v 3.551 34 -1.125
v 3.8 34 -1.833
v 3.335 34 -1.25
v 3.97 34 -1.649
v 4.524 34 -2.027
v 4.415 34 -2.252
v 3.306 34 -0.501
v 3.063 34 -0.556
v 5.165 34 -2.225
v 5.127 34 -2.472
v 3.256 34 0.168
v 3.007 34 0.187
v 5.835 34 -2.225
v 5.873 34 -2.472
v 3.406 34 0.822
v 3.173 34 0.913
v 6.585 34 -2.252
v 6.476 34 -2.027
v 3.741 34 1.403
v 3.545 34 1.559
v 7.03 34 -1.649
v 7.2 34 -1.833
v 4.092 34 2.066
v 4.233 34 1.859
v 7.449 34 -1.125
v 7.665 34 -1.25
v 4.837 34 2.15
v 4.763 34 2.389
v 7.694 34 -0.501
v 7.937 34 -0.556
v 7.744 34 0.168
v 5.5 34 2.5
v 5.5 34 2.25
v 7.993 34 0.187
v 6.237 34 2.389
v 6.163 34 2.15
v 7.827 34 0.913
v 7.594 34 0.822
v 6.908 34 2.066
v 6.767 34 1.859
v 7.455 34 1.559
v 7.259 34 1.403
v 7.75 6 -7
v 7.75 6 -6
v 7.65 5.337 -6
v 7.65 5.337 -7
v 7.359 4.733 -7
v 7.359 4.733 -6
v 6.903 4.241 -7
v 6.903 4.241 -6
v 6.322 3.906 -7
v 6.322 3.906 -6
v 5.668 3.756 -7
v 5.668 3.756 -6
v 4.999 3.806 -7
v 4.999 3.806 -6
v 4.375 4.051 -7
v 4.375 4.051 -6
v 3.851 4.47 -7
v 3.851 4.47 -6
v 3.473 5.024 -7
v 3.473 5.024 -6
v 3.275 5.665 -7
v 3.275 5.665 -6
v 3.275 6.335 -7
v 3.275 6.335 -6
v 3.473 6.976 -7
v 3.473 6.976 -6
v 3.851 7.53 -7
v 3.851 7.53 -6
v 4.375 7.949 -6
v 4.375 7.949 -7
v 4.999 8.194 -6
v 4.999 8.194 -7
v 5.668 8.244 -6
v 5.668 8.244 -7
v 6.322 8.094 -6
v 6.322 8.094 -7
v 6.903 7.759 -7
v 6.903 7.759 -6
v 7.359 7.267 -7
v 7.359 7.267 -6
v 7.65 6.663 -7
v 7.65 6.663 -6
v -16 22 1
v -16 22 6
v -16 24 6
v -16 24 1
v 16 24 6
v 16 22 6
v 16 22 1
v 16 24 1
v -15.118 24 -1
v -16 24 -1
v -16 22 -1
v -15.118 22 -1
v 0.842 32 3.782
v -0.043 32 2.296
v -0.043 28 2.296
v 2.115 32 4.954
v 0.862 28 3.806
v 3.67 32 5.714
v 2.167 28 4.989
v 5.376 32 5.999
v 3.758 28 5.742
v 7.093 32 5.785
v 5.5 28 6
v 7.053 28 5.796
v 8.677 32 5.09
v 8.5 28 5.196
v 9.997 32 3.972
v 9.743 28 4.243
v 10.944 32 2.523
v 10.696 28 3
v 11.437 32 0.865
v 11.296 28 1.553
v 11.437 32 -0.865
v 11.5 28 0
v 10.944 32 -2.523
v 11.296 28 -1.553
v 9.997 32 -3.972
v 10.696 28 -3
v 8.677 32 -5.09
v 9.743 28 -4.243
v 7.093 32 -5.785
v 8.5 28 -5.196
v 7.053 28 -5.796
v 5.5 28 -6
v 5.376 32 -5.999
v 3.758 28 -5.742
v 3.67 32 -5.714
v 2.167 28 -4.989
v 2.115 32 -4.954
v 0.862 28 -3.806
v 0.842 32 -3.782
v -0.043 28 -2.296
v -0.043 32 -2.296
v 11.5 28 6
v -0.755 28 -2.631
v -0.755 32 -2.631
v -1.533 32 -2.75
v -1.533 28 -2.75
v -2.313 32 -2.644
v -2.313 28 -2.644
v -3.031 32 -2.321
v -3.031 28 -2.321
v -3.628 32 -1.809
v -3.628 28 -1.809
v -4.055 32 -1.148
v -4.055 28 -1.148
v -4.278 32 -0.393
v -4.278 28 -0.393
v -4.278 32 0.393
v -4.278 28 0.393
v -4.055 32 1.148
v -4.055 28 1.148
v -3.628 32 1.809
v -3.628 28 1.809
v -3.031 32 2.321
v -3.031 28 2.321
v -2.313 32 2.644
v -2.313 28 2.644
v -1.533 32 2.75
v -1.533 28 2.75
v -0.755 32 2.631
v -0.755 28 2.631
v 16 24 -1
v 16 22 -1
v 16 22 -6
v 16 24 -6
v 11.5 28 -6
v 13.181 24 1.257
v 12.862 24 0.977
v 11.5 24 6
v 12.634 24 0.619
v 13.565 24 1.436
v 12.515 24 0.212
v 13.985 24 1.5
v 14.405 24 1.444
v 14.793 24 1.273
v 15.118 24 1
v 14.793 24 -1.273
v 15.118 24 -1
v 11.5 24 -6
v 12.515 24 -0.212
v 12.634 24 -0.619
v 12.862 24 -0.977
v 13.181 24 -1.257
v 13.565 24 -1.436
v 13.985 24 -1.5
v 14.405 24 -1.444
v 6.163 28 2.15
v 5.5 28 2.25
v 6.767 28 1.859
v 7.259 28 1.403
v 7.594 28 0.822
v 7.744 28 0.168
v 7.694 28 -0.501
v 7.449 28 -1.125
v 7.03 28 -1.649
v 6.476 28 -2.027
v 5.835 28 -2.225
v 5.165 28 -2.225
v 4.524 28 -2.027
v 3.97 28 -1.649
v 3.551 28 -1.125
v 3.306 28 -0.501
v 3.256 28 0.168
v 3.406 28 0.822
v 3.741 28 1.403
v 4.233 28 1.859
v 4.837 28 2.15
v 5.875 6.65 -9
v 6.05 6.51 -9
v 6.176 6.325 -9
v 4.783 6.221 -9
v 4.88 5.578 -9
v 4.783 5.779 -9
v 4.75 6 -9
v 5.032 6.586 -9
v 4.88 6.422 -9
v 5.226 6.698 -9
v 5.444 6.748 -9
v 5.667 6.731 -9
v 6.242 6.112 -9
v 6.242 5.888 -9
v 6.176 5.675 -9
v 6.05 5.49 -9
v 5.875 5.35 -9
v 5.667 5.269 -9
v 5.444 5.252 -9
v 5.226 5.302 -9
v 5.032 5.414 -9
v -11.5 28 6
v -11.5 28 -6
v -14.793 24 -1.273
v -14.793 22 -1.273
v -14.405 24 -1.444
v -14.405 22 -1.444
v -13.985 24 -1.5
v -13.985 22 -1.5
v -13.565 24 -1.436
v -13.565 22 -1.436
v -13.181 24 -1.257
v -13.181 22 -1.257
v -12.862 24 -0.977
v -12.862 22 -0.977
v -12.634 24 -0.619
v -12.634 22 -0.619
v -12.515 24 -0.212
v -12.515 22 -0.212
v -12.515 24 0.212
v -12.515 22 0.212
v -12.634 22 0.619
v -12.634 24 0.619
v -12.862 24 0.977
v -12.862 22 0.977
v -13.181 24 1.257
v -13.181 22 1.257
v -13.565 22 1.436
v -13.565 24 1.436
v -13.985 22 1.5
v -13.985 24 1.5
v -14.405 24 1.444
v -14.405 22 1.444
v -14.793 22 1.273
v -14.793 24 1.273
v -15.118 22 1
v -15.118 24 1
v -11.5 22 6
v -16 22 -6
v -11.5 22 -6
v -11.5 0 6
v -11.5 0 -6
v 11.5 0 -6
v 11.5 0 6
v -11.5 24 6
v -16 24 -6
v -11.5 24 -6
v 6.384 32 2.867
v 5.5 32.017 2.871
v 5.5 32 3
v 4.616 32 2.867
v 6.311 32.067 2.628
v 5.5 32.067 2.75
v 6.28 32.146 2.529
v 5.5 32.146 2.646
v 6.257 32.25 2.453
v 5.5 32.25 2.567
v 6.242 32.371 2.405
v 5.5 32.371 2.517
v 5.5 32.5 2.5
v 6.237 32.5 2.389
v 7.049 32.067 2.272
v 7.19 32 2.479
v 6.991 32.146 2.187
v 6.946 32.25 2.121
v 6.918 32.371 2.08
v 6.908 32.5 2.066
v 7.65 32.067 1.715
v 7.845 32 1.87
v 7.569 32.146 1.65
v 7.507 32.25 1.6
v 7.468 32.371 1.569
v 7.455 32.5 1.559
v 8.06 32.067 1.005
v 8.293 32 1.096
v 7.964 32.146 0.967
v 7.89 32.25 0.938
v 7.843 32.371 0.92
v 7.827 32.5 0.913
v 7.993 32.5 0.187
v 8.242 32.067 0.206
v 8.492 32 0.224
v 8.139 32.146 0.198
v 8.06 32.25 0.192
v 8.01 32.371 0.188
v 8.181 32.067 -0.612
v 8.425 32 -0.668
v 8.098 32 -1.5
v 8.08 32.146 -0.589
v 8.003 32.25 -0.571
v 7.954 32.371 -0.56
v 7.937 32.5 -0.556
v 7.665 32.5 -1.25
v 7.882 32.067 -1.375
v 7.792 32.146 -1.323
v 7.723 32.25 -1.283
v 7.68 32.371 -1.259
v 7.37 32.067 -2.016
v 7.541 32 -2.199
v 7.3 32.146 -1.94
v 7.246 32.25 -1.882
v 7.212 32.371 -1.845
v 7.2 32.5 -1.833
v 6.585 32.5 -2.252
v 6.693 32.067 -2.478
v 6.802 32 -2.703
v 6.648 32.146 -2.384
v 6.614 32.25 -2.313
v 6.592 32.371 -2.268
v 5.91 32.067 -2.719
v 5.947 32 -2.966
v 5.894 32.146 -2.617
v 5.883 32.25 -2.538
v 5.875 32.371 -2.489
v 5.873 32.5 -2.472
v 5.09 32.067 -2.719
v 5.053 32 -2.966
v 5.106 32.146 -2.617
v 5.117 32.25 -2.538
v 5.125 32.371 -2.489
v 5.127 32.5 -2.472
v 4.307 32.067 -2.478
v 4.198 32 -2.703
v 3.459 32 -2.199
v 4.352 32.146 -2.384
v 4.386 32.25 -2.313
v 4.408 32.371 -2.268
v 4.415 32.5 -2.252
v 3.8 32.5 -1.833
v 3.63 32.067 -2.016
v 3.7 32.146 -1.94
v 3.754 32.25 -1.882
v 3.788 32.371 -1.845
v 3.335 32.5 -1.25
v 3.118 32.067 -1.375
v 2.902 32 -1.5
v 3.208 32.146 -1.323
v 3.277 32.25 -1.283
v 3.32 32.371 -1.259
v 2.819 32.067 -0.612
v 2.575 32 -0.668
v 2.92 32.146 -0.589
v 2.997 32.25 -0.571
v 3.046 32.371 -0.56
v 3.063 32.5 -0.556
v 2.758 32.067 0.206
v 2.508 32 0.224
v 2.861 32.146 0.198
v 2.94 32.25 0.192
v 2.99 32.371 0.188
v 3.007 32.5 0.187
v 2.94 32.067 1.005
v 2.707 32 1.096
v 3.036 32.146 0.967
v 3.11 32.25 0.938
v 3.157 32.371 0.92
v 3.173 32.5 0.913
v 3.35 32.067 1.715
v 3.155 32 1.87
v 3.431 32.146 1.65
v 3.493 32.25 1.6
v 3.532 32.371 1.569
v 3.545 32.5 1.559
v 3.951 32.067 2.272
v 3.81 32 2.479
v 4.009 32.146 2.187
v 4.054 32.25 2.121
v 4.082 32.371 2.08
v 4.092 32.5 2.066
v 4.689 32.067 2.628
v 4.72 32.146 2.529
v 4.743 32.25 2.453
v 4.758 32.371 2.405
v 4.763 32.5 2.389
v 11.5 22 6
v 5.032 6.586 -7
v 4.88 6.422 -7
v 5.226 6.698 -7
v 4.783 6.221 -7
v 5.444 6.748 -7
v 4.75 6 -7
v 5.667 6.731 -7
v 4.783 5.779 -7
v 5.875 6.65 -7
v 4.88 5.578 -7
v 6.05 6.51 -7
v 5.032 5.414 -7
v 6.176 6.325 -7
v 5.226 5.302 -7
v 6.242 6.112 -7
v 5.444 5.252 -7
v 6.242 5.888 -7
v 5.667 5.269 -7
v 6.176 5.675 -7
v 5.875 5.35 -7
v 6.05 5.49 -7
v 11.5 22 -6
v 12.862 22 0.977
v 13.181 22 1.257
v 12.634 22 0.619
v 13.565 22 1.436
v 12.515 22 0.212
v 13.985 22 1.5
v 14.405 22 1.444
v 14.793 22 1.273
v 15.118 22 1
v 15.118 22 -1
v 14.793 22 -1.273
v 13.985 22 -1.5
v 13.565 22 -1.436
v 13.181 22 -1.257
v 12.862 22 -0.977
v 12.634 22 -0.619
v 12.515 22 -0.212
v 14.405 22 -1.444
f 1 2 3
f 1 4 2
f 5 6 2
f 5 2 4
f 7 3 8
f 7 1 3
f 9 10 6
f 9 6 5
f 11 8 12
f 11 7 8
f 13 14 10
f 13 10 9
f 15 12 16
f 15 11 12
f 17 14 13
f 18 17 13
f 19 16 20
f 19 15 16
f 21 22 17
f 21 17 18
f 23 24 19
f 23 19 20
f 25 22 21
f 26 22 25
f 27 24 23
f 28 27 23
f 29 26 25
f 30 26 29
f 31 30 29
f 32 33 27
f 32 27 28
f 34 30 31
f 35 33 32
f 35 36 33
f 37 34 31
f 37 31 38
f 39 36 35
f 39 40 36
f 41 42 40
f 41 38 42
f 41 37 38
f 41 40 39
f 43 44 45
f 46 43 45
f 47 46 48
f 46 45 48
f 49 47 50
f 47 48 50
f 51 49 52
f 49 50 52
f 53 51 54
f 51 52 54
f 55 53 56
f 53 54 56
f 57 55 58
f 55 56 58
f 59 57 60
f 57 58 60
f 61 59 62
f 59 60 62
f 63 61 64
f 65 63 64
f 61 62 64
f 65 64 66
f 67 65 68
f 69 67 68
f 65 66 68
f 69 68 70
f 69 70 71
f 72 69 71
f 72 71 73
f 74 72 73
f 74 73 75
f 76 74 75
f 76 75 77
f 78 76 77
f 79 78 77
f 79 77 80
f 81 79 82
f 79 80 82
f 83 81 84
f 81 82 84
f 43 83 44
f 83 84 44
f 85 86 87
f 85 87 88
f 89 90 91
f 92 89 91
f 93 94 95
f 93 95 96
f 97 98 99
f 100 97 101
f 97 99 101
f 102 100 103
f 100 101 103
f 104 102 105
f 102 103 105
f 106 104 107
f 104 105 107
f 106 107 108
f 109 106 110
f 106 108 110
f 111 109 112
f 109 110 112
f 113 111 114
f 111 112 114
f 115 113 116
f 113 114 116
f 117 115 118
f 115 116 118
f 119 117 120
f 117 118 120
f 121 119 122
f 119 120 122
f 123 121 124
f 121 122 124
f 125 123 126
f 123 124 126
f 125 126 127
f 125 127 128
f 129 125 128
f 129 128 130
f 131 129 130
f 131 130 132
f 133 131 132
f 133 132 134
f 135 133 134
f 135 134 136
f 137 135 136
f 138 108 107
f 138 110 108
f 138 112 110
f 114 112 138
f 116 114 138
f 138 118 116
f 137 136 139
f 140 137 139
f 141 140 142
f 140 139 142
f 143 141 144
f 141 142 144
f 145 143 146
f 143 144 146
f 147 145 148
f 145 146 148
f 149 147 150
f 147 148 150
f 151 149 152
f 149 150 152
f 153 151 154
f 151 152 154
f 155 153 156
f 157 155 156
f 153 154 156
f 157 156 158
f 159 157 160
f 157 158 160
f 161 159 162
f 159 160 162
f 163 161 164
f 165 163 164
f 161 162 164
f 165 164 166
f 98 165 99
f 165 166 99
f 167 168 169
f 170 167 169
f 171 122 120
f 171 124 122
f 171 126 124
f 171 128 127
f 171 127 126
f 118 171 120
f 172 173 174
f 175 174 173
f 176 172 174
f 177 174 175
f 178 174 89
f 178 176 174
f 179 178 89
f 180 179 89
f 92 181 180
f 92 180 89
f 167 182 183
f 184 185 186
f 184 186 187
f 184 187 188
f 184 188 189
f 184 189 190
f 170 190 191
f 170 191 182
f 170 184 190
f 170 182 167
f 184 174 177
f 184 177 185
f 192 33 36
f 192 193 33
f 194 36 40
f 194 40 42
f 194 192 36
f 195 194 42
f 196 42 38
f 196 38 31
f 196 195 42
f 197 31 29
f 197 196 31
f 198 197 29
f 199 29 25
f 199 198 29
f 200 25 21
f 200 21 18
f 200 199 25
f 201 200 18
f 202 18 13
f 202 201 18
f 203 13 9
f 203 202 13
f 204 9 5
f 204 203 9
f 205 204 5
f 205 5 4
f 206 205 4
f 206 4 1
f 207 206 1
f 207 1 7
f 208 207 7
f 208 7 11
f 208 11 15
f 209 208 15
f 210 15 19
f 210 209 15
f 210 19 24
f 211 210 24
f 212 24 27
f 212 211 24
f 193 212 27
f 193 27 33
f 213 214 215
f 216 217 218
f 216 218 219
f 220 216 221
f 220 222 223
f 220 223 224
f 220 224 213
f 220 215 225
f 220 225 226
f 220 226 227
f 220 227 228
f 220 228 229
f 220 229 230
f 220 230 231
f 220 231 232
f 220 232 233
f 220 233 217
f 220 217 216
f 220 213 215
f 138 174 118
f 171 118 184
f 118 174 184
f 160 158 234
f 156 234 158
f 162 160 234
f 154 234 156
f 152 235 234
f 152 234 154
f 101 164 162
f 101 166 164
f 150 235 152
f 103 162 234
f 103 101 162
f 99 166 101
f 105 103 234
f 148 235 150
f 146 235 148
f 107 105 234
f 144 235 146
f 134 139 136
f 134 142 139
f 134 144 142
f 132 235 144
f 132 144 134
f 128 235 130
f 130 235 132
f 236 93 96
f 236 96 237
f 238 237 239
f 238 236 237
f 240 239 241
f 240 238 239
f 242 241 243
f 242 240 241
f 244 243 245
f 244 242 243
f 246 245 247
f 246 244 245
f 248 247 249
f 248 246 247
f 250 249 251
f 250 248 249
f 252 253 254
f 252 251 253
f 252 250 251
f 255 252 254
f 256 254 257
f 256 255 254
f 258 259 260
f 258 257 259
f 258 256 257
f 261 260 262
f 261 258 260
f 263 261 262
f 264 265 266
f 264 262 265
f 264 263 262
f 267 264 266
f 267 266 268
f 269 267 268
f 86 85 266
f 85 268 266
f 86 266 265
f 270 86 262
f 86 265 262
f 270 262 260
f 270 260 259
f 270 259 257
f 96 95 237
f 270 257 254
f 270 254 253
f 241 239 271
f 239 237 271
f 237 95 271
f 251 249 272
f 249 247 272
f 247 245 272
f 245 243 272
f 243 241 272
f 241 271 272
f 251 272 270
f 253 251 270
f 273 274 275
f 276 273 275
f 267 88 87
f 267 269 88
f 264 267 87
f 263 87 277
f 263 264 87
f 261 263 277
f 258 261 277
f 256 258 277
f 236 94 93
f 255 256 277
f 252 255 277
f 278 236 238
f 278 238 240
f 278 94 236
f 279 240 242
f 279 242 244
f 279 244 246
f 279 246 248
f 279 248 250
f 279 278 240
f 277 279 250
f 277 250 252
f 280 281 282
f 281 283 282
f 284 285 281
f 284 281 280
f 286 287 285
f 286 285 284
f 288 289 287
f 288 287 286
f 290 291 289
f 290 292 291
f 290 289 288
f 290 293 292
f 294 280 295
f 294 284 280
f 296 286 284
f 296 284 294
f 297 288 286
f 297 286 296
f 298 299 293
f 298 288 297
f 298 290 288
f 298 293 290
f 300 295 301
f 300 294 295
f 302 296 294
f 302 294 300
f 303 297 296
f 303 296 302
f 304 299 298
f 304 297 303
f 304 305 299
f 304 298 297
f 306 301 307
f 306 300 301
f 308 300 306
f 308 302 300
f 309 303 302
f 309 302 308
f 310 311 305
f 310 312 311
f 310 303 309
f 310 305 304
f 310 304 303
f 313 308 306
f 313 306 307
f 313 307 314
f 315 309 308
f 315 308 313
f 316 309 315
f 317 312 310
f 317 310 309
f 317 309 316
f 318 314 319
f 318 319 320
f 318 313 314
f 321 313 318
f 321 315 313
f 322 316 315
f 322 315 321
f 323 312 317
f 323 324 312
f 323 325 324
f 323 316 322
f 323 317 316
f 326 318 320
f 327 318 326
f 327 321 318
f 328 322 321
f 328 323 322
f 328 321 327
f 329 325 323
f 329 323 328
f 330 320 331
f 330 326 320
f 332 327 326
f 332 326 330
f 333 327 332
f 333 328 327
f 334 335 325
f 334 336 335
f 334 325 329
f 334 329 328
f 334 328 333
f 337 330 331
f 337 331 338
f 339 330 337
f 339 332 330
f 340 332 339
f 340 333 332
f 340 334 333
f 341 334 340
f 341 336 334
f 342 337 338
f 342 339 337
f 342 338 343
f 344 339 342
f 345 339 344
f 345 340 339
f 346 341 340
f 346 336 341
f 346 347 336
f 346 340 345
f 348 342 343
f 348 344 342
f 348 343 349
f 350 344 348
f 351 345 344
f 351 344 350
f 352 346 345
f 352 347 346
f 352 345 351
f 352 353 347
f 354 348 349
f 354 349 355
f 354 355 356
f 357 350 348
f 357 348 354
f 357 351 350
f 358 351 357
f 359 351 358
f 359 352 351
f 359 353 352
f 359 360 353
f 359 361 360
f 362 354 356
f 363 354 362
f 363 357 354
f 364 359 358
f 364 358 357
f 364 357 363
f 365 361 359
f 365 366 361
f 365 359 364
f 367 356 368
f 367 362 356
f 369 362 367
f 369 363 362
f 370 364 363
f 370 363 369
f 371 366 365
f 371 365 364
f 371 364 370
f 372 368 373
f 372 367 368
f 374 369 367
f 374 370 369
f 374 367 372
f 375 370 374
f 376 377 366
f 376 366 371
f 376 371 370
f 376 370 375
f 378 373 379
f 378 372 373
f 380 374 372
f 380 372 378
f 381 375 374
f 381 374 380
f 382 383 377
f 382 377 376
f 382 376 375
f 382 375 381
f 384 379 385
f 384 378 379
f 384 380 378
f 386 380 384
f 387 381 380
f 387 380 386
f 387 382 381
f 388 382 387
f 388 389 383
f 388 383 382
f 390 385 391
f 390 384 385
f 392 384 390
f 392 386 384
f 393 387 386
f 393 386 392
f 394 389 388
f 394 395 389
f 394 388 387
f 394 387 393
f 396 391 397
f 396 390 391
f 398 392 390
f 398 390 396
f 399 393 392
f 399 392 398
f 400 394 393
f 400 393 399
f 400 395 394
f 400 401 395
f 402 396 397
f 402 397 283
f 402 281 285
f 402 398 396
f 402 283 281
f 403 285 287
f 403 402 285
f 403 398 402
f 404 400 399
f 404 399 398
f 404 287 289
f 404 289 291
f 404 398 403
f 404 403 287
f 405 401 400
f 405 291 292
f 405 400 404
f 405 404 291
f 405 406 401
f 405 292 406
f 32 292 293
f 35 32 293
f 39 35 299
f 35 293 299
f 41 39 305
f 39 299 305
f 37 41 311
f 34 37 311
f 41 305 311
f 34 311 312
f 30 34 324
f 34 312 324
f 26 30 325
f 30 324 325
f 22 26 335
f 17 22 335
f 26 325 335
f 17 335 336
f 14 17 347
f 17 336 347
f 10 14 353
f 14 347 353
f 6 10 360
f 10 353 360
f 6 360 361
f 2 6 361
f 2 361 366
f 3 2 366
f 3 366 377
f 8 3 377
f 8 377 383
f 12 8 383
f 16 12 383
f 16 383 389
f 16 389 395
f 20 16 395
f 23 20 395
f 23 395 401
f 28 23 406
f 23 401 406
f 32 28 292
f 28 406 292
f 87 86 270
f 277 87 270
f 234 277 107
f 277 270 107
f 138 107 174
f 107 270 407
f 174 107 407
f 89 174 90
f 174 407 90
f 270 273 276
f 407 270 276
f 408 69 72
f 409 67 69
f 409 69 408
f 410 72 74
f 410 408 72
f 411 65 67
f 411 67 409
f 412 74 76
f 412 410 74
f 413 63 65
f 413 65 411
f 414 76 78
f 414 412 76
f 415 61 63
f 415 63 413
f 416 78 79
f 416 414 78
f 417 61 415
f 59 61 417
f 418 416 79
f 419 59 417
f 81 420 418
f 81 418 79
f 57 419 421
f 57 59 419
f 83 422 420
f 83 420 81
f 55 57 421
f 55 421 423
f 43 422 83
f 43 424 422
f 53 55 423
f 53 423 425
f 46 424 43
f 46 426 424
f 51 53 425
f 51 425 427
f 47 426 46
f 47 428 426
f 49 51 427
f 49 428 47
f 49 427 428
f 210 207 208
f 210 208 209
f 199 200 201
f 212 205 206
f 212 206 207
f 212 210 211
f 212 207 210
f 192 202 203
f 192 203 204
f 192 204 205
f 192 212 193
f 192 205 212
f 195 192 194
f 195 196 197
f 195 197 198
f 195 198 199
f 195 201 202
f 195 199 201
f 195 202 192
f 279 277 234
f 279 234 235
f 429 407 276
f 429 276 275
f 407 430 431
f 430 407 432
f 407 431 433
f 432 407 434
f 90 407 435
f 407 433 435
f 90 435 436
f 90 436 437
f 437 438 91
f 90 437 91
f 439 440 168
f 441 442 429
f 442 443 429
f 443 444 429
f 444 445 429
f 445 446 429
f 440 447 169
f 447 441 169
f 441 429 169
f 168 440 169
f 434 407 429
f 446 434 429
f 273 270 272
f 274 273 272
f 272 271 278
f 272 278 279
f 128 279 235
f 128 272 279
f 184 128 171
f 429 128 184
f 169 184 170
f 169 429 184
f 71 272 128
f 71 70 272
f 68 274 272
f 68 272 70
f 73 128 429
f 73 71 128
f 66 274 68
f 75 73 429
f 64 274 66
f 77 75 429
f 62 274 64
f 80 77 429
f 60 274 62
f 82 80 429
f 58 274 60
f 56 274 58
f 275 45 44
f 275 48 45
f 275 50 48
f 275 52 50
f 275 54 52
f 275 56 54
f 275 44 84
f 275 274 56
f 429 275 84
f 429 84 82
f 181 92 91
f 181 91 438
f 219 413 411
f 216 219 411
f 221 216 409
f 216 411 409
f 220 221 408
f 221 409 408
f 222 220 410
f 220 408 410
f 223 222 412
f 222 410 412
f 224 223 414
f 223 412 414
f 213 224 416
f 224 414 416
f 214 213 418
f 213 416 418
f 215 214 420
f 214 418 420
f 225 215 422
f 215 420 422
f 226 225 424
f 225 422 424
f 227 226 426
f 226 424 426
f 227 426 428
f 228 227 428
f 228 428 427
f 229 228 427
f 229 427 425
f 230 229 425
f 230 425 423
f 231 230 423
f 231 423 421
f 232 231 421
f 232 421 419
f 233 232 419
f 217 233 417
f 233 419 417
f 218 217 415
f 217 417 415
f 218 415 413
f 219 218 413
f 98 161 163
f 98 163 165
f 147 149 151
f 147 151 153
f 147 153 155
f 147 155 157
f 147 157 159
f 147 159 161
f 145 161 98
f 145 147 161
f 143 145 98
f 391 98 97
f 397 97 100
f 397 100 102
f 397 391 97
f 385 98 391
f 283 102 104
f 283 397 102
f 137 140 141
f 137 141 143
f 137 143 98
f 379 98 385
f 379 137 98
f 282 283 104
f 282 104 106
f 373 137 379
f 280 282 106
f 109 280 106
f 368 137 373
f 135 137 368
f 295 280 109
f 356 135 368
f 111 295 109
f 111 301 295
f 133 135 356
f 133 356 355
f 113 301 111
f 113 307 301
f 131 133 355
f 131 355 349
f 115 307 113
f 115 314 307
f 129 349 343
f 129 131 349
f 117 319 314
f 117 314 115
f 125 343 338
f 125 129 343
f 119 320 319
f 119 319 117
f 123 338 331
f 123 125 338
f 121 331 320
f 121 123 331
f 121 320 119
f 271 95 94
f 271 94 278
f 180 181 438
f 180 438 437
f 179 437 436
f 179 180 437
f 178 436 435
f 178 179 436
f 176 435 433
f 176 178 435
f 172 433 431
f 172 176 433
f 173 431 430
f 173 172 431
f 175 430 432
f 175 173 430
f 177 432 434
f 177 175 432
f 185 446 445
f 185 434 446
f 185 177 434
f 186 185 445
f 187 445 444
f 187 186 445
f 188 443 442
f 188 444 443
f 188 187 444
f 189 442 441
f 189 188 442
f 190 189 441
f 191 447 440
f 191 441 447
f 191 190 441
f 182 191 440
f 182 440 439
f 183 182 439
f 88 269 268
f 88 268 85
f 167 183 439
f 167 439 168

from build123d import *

# Parameters (mm, degrees)
SKETCH1_W           = 23
SKETCH1_H           = 12
BOSS_EXTRUDE1_DEPTH = 22
SKETCH2_W           = 32
SKETCH2_H           = 12
BOSS_EXTRUDE2_DEPTH = 2
CUT_EXTRUDE1_DEPTH  = 5
SKETCH3_W           = 23
SKETCH3_H           = 12
BOSS_EXTRUDE4_DEPTH = 4
BOSS_EXTRUDE5_DEPTH = 4
SKETCH6_R           = 2.5
SKETCH6_R_2         = 2.25
BOSS_EXTRUDE6_DEPTH = 2
CUT_EXTRUDE2_START  = -4
SKETCH7_R           = 2.25
CUT_EXTRUDE2_DEPTH  = 4
FILLET4_R           = 0.5
SKETCH8_R           = 2.25
BOSS_EXTRUDE7_DEPTH = 1
SKETCH9_R           = 0.75
BOSS_EXTRUDE8_DEPTH = 2


with BuildPart() as part:
    # Sketch1 → Boss-Extrude1 (new body)
    with BuildSketch(Plane(origin=(0, 0, 0), x_dir=(1, 0, 0), z_dir=(0, 1, 0))):
        Rectangle(SKETCH1_W, SKETCH1_H)
    extrude(amount=BOSS_EXTRUDE1_DEPTH)

    # Sketch2 → Boss-Extrude2 (add)
    with BuildSketch(Plane(origin=(0, 22, 0), x_dir=(1, 0, 0), z_dir=(0, 1, 0))):
        Rectangle(SKETCH2_W, SKETCH2_H)
    extrude(amount=BOSS_EXTRUDE2_DEPTH)

    # Sketch4 → Cut-Extrude1 (cut)
    with BuildSketch(Plane(origin=(0, 24, 0), x_dir=(1, 0, 0), z_dir=(0, 1, 0))):
        with BuildLine():
            Line((-16.63954717, 1), (-15.118033989, 1))
            ThreePointArc((-15.118033989, 1), (-12.5, 0), (-15.118033989, -1))
            Line((-15.118033989, -1), (-16.63954717, -1))
            Line((-16.63954717, -1), (-16.63954717, 1))
        make_face()
        with BuildLine():
            Line((15.118033989, 1), (17.121315796, 1))
            Line((17.121315796, 1), (17.121315796, -1))
            Line((17.121315796, -1), (15.118033989, -1))
            ThreePointArc((15.118033989, -1), (12.5, 0), (15.118033989, 1))
        make_face()
    extrude(amount=-CUT_EXTRUDE1_DEPTH, mode=Mode.SUBTRACT)

    # Sketch3 → Boss-Extrude4 (add)
    with BuildSketch(Plane(origin=(0, 24, 0), x_dir=(1, 0, 0), z_dir=(0, 1, 0))):
        Rectangle(SKETCH3_W, SKETCH3_H)
    extrude(amount=BOSS_EXTRUDE4_DEPTH)

    # Sketch5 → Boss-Extrude5 (add)
    with BuildSketch(Plane(origin=(0, 28, 0), x_dir=(1, 0, 0), z_dir=(0, 1, 0))):
        with BuildLine():
            ThreePointArc((-0.043232592, -2.296208273), (11.5, 0), (-0.043232592, 2.296208273))
            ThreePointArc((-0.043232592, 2.296208273), (-4.306483254, 0), (-0.043232592, -2.296208273))
        make_face()
    extrude(amount=BOSS_EXTRUDE5_DEPTH)

    # Sketch6 → Boss-Extrude6 (add)
    with BuildSketch(Plane(origin=(0, 32, 0), x_dir=(1, 0, 0), z_dir=(0, 1, 0))):
        with Locations(Location((5.5, 0, 0), (0, 0, 270))):
            Circle(SKETCH6_R)
        with Locations(Location((5.5, 0, 0), (0, 0, 270))):
            Circle(SKETCH6_R_2, mode=Mode.SUBTRACT)
    extrude(amount=BOSS_EXTRUDE6_DEPTH)

    # Sketch7 → Cut-Extrude2 (cut)
    with BuildSketch(Plane(origin=(0, 32, 0), x_dir=(1, 0, 0), z_dir=(0, 1, 0)).offset(CUT_EXTRUDE2_START)):
        with Locations(Location((5.5, 0, 0), (0, 0, 270))):
            Circle(SKETCH7_R)
    extrude(amount=CUT_EXTRUDE2_DEPTH, mode=Mode.SUBTRACT)

    # Fillet4
    fillet4_edges = [part.edges().sort_by_distance(p)[0] for p in [
        (5.5, 32, -2.5),
    ]]
    fillet(fillet4_edges, radius=FILLET4_R)

    # Sketch8 → Boss-Extrude7 (add)
    with BuildSketch(Plane(origin=(0, 0, -6), x_dir=(-1, 0, 0), z_dir=(0, 0, -1))):
        with Locations(Location((-5.5, 6, 0), (0, 0, 180))):
            Circle(SKETCH8_R)
    extrude(amount=BOSS_EXTRUDE7_DEPTH)

    # Sketch9 → Boss-Extrude8 (add)
    with BuildSketch(Plane(origin=(0, 0, -7), x_dir=(-1, 0, 0), z_dir=(0, 0, -1))):
        with Locations((-5.5, 6)):
            Circle(SKETCH9_R)
    extrude(amount=BOSS_EXTRUDE8_DEPTH)


solid = part.part
